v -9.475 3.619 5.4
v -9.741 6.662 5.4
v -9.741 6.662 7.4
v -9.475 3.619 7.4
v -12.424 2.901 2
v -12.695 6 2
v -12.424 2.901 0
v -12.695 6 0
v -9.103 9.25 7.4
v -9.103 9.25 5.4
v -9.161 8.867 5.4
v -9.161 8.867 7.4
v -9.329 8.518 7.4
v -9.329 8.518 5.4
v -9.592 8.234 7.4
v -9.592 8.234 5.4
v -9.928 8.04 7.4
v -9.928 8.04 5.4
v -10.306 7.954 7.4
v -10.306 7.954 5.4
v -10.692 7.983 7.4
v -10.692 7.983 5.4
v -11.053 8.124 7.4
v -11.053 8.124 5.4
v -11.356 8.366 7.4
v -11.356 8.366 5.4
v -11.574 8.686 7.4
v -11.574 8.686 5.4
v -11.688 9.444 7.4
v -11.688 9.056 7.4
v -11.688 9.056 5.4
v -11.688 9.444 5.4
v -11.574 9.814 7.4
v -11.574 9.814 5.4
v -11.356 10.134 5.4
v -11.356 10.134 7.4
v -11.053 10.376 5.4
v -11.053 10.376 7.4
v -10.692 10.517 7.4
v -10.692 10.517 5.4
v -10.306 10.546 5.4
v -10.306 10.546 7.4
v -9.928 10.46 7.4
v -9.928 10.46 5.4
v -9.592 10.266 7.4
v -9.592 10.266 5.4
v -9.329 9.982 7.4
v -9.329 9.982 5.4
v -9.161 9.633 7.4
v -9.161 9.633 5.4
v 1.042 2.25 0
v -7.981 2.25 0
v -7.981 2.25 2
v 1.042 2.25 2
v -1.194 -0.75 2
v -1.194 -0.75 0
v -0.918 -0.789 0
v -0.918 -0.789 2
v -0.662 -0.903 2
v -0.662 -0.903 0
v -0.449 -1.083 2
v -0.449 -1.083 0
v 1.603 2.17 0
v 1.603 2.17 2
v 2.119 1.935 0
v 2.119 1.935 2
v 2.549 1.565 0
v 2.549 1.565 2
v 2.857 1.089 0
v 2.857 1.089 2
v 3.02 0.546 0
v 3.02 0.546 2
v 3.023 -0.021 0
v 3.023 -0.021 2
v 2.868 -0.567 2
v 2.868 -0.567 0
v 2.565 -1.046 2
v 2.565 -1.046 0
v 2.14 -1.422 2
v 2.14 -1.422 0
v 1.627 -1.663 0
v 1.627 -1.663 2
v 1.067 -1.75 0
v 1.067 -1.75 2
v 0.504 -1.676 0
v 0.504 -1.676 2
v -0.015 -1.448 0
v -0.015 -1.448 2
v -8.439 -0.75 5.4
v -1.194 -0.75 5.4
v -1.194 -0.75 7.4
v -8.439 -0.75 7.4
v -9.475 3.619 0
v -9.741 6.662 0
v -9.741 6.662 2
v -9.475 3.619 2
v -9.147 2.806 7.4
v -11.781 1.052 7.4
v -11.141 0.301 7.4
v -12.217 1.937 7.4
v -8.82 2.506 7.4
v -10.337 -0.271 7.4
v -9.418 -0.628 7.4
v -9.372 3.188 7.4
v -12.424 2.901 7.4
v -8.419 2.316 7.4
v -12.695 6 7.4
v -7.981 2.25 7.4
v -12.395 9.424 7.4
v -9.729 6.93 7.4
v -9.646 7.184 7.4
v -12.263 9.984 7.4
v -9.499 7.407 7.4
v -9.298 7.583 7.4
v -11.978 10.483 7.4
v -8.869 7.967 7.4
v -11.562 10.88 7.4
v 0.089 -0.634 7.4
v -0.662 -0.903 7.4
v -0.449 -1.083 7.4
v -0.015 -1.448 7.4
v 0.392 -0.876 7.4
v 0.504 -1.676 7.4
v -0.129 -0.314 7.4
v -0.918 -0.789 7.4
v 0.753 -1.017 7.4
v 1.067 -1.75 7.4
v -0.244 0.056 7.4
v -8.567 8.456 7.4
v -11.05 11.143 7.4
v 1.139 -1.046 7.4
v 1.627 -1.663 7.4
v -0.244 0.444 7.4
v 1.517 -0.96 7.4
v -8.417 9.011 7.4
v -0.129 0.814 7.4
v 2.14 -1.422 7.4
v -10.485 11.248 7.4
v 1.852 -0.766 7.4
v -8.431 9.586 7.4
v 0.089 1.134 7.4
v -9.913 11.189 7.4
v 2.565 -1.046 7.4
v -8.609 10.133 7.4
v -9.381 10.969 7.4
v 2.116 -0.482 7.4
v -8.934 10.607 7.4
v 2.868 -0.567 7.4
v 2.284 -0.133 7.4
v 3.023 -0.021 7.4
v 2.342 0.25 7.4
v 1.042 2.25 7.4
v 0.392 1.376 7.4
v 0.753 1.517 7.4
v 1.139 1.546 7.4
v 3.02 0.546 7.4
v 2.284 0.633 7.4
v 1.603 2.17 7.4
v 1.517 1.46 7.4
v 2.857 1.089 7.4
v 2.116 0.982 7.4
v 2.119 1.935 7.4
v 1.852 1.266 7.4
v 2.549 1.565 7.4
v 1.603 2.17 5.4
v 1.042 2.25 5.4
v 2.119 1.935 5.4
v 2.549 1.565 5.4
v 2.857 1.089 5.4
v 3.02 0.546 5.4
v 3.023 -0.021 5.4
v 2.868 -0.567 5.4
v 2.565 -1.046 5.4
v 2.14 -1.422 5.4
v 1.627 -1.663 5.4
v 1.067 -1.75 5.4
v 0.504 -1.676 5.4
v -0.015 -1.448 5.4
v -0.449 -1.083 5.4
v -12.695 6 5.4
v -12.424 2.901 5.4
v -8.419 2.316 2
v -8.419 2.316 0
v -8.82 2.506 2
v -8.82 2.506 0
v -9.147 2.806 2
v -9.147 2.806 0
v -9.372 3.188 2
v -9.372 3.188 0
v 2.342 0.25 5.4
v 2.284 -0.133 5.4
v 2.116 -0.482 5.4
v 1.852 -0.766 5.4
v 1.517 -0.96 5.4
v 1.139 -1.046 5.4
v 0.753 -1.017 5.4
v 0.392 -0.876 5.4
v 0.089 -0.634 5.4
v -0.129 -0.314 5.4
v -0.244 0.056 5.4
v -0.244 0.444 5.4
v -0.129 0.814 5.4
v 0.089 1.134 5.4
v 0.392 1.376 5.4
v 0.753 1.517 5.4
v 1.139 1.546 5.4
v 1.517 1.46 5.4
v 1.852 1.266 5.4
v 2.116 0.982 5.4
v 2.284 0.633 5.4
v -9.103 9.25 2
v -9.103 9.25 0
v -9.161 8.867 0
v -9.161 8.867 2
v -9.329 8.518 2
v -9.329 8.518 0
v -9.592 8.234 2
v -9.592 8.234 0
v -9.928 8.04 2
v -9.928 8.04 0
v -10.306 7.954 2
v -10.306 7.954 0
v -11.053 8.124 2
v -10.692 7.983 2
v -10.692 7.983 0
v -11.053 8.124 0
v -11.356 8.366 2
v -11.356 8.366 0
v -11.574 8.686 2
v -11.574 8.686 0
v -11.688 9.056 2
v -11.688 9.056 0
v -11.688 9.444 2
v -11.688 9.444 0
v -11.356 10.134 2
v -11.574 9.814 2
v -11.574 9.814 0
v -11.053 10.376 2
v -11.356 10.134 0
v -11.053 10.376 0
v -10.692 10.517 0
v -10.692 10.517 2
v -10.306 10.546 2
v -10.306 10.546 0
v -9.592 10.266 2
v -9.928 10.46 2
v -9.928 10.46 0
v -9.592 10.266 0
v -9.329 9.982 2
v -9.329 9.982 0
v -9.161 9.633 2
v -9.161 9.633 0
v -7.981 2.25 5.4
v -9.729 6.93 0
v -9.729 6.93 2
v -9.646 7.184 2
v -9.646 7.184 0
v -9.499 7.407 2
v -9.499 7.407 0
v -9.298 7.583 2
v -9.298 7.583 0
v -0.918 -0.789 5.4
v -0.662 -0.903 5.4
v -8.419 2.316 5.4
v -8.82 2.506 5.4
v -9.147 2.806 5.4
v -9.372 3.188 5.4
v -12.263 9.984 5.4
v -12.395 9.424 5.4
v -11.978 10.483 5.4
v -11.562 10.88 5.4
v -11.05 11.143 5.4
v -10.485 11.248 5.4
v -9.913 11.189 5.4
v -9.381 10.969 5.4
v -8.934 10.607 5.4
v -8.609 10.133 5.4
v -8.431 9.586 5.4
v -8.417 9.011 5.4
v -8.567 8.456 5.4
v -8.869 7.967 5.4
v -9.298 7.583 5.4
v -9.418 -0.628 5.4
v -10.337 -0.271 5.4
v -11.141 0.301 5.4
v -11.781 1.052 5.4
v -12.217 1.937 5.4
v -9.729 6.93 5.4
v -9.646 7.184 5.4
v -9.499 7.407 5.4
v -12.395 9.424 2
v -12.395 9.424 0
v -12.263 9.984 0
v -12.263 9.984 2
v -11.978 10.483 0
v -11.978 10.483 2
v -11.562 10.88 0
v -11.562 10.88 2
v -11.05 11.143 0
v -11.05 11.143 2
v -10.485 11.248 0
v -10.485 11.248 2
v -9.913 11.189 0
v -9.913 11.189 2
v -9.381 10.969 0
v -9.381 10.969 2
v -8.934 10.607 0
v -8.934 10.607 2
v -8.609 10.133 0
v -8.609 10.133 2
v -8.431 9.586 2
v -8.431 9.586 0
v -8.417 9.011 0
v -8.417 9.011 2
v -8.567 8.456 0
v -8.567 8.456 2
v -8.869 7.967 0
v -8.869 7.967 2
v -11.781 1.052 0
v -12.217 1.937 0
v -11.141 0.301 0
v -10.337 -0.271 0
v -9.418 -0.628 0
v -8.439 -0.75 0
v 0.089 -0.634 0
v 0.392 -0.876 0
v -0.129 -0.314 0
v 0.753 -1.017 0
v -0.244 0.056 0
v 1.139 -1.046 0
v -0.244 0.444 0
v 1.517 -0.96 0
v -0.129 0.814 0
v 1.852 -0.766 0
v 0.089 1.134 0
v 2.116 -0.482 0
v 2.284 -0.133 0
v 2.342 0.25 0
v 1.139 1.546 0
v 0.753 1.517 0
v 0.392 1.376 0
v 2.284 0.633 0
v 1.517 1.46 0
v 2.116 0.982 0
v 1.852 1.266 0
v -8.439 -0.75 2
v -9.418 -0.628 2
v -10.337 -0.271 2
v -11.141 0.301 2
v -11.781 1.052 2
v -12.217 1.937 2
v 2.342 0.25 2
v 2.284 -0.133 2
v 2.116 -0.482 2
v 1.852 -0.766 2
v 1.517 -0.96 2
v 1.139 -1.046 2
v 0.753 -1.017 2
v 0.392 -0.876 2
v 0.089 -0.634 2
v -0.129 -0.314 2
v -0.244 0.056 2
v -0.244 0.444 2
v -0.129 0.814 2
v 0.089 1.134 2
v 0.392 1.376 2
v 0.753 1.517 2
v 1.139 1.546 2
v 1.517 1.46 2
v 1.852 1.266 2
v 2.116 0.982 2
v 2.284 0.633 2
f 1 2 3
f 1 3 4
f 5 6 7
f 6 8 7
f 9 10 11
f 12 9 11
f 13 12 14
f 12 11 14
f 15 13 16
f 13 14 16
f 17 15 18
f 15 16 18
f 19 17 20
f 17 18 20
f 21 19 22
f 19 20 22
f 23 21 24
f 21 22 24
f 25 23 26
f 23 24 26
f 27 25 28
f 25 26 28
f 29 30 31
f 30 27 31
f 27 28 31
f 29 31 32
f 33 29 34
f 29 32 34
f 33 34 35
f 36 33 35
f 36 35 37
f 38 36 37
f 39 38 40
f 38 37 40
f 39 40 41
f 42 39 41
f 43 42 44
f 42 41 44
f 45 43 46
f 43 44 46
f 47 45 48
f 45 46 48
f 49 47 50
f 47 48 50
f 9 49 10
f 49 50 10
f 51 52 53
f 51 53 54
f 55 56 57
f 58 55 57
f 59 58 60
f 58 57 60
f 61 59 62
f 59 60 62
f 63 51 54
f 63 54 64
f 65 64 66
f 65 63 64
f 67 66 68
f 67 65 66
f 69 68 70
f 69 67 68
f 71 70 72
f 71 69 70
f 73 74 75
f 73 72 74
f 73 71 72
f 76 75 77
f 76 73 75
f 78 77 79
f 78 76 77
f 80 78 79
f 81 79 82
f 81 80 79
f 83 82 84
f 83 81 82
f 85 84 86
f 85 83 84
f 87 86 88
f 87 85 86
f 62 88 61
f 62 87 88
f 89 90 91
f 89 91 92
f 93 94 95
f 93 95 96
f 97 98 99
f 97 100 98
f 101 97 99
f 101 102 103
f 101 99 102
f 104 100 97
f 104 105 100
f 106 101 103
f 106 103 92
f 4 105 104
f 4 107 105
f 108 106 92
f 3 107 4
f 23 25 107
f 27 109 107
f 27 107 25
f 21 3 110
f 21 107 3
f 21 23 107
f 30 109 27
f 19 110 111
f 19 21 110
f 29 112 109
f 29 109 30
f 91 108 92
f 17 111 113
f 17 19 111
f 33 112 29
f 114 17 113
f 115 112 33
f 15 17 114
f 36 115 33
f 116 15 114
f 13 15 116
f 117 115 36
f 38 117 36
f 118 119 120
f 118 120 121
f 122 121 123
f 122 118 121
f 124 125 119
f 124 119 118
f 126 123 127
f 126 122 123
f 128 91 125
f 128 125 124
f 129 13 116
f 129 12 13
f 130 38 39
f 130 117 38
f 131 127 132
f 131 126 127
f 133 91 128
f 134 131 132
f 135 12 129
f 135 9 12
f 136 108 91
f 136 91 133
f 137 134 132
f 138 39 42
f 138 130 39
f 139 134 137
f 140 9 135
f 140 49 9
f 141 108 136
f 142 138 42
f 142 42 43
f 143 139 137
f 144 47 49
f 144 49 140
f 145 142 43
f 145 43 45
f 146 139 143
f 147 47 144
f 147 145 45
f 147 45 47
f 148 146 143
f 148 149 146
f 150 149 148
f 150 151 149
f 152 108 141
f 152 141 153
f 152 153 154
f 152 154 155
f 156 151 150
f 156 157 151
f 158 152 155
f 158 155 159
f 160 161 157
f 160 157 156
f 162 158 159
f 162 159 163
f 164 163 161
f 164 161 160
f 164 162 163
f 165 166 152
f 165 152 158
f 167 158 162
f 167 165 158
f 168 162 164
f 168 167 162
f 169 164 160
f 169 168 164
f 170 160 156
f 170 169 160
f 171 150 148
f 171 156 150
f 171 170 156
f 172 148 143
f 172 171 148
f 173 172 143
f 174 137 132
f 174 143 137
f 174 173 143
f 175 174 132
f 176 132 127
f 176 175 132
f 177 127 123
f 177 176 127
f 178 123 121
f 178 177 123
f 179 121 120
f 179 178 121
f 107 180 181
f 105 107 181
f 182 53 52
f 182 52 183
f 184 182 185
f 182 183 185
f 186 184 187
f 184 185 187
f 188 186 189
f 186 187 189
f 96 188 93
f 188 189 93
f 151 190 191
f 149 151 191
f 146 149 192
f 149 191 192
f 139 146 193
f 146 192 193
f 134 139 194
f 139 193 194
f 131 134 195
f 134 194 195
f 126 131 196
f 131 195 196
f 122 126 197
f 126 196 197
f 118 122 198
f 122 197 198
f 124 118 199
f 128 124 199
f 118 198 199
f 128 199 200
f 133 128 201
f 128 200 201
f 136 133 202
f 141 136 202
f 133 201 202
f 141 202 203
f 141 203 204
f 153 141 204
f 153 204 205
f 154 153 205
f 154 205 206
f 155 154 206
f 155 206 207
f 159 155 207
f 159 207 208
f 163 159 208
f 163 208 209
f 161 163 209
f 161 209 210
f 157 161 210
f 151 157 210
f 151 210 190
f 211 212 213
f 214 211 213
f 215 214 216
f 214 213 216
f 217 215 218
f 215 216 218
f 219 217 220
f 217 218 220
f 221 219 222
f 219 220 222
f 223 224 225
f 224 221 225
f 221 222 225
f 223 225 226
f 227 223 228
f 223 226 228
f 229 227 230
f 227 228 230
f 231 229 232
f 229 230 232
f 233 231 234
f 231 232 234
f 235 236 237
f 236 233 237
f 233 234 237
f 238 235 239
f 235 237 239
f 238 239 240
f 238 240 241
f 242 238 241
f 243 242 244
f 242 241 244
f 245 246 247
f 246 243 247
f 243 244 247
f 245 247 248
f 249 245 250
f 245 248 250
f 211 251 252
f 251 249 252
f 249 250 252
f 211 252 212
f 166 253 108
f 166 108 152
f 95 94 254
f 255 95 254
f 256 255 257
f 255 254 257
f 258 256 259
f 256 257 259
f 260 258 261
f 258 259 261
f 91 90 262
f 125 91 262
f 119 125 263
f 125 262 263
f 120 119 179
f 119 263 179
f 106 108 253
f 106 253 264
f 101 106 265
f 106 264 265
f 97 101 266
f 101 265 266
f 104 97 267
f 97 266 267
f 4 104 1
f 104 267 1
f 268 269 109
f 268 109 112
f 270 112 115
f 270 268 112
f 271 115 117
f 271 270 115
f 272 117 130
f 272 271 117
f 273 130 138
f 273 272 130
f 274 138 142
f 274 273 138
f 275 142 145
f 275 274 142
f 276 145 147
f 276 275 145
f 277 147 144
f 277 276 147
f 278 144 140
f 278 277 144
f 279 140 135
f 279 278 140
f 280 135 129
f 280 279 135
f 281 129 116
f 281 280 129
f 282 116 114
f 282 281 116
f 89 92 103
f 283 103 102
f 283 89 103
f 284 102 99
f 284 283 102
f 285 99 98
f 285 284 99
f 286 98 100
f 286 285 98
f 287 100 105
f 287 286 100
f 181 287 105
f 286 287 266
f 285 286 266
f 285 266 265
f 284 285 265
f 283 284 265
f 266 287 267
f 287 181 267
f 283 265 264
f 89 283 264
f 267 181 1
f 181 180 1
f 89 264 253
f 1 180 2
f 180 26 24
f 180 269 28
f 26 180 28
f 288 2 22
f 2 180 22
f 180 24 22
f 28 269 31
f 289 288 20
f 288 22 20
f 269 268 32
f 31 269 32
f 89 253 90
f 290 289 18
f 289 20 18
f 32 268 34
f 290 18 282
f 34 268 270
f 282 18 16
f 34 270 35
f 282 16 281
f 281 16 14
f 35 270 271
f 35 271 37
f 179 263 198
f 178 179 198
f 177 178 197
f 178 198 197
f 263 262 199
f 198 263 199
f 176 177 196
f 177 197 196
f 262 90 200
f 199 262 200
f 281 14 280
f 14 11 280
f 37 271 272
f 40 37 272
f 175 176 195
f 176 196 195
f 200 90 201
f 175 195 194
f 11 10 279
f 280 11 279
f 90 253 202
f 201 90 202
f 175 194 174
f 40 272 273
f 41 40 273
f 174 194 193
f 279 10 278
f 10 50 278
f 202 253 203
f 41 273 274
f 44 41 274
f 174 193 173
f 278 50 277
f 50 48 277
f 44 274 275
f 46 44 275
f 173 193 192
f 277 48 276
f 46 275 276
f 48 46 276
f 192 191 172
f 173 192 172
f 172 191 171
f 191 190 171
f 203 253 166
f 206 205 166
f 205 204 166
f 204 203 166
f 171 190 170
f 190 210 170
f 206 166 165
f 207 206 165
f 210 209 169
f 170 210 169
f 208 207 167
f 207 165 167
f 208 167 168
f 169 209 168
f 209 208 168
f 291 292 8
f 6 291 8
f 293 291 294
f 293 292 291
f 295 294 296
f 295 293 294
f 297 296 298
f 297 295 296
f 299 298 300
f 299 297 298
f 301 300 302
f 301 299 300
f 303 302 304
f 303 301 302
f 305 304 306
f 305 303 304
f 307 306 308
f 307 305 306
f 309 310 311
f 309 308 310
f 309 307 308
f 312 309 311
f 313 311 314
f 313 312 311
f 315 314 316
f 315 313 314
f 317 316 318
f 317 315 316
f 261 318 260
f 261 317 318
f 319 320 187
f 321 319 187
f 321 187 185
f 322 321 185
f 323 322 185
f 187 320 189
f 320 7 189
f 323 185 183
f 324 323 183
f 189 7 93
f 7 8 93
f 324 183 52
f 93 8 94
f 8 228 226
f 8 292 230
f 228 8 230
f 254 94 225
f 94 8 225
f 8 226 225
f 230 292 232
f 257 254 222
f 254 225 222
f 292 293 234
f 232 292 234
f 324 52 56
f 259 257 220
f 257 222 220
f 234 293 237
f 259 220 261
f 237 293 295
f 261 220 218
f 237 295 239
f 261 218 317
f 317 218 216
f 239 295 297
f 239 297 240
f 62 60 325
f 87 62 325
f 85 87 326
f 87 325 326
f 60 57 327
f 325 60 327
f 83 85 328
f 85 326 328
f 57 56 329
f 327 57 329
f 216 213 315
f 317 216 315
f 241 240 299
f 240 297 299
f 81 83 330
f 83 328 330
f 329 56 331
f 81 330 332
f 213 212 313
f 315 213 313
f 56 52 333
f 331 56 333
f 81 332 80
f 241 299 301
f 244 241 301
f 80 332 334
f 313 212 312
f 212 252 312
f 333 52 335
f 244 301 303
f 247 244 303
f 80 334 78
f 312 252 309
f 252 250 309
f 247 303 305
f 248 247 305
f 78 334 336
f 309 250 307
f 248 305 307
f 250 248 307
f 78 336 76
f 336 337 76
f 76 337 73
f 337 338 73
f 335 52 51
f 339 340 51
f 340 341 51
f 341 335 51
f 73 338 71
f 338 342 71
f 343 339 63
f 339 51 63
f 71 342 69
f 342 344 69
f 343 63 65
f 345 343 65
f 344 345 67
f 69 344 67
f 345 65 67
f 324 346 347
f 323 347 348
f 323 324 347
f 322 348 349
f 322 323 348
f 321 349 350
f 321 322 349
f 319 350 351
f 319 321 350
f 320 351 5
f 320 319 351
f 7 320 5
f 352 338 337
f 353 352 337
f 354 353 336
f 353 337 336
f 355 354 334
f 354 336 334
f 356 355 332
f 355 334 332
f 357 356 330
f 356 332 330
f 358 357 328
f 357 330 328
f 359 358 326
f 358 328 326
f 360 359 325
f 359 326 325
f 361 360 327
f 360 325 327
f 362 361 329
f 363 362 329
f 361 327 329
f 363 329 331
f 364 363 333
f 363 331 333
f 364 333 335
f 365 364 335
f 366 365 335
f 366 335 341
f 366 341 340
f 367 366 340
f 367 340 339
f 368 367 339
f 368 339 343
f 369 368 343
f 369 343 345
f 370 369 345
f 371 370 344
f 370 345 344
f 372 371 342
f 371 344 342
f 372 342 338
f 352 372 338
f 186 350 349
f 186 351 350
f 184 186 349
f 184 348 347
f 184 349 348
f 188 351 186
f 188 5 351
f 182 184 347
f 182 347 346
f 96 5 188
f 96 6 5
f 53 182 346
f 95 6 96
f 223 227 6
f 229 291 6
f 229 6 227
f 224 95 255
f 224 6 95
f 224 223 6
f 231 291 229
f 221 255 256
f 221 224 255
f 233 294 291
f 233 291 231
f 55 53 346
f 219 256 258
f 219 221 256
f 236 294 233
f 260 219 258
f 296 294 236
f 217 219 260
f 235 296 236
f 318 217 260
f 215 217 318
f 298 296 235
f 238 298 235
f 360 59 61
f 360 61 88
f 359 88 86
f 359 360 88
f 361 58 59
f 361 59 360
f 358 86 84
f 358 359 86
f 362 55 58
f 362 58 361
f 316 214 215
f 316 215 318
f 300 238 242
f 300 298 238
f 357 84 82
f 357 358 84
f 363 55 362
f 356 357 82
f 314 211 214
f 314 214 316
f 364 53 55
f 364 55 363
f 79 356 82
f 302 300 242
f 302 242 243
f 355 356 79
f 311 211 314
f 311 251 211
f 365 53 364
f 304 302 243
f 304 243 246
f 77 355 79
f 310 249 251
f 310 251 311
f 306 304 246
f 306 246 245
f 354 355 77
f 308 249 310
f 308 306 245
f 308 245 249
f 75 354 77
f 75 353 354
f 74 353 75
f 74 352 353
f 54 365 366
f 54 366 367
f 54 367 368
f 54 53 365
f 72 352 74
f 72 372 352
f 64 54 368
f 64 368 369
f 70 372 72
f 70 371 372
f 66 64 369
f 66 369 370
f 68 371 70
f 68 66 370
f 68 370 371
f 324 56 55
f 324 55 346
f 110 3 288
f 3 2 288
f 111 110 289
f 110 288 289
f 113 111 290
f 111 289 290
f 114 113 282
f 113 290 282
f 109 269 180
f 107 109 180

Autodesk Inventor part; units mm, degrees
ref_plane "YZ Plane" through (0, 0, 0) normal (1, 0, 0) x (0, 1, 0)
ref_plane "XZ Plane" through (0, 0, 0) normal (0, 1, 0) x (-1, 0, 0)
ref_plane "XY Plane" through (0, 0, 0) normal (0, 0, 1) x (1, 0, 0)
sketch "Sketch1" plane through (0, 0, 0) normal (0, 0, 1) x (1, 0, 0)
  line L0 (-16.4974, 0) -> (7.0477, 0) projected
  arc A0 (-9.2978, 7.5831) -> (-12.3954, 9.4243) centre (-10.403, 9.25) ccw
  arc A1 (-0.4489, -1.0833) -> (1.0419, 2.25) centre (1.0419, 0.25) ccw
  line L1 (-12.3954, 9.4243) -> (-12.6949, 6)
  line L2 (-12.6949, 6) -> (-12.4238, 2.9014)
  line L3 (-9.7414, 6.6625) -> (-9.4752, 3.6193)
  line L4 (-7.9809, 2.25) -> (1.0419, 2.25)
  line L5 (-1.1942, -0.75) -> (-8.4391, -0.75)
  arc A2 (-9.2978, 7.5831) -> (-9.7414, 6.6625) centre (-8.7452, 6.7496) ccw
  arc A3 (-9.4752, 3.6193) -> (-7.9809, 2.25) centre (-7.9809, 3.75) ccw
  arc A4 (-12.4238, 2.9014) -> (-8.4391, -0.75) centre (-8.4391, 3.25) ccw
  arc A5 (-0.4489, -1.0833) -> (-1.1942, -0.75) centre (-1.1942, -1.75) ccw
  circle A6 centre (-10.403, 9.25) radius 1.3
  circle A7 centre (1.0419, 0.25) radius 1.3
  line L6 (-10.403, 9.25) -> (1.0419, 0.25) construction
  point P0 (0, 0)
  dimension "d4" = 3
  dimension "d5" = 4
  dimension "d6" = 3
  dimension "d13" = 6
  dimension "d15" = 1
  dimension "d16" = 1.5
  dimension "d17" = 4
  dimension "d18" = 1
  dimension "d27" = 10
  dimension "d31" = 95
  dimension "d32" = 2.6
  dimension "d34" = 0.75
  dimension "d39" = 7
  dimension "d41" = 11.4448
extrude "Extrusion1" add sketch "Sketch1" along normal blind 2 contours A4 L2 L1 A0 A2 L3 A3 L4 A1 L0 A7 | L0 A7 A1 A5 L5 A4
pattern_linear "Rectangular Pattern1" count 2 spacing 5.4 along (0, 0, 1)
properties part number "D26 Linkages" material "Steel"
